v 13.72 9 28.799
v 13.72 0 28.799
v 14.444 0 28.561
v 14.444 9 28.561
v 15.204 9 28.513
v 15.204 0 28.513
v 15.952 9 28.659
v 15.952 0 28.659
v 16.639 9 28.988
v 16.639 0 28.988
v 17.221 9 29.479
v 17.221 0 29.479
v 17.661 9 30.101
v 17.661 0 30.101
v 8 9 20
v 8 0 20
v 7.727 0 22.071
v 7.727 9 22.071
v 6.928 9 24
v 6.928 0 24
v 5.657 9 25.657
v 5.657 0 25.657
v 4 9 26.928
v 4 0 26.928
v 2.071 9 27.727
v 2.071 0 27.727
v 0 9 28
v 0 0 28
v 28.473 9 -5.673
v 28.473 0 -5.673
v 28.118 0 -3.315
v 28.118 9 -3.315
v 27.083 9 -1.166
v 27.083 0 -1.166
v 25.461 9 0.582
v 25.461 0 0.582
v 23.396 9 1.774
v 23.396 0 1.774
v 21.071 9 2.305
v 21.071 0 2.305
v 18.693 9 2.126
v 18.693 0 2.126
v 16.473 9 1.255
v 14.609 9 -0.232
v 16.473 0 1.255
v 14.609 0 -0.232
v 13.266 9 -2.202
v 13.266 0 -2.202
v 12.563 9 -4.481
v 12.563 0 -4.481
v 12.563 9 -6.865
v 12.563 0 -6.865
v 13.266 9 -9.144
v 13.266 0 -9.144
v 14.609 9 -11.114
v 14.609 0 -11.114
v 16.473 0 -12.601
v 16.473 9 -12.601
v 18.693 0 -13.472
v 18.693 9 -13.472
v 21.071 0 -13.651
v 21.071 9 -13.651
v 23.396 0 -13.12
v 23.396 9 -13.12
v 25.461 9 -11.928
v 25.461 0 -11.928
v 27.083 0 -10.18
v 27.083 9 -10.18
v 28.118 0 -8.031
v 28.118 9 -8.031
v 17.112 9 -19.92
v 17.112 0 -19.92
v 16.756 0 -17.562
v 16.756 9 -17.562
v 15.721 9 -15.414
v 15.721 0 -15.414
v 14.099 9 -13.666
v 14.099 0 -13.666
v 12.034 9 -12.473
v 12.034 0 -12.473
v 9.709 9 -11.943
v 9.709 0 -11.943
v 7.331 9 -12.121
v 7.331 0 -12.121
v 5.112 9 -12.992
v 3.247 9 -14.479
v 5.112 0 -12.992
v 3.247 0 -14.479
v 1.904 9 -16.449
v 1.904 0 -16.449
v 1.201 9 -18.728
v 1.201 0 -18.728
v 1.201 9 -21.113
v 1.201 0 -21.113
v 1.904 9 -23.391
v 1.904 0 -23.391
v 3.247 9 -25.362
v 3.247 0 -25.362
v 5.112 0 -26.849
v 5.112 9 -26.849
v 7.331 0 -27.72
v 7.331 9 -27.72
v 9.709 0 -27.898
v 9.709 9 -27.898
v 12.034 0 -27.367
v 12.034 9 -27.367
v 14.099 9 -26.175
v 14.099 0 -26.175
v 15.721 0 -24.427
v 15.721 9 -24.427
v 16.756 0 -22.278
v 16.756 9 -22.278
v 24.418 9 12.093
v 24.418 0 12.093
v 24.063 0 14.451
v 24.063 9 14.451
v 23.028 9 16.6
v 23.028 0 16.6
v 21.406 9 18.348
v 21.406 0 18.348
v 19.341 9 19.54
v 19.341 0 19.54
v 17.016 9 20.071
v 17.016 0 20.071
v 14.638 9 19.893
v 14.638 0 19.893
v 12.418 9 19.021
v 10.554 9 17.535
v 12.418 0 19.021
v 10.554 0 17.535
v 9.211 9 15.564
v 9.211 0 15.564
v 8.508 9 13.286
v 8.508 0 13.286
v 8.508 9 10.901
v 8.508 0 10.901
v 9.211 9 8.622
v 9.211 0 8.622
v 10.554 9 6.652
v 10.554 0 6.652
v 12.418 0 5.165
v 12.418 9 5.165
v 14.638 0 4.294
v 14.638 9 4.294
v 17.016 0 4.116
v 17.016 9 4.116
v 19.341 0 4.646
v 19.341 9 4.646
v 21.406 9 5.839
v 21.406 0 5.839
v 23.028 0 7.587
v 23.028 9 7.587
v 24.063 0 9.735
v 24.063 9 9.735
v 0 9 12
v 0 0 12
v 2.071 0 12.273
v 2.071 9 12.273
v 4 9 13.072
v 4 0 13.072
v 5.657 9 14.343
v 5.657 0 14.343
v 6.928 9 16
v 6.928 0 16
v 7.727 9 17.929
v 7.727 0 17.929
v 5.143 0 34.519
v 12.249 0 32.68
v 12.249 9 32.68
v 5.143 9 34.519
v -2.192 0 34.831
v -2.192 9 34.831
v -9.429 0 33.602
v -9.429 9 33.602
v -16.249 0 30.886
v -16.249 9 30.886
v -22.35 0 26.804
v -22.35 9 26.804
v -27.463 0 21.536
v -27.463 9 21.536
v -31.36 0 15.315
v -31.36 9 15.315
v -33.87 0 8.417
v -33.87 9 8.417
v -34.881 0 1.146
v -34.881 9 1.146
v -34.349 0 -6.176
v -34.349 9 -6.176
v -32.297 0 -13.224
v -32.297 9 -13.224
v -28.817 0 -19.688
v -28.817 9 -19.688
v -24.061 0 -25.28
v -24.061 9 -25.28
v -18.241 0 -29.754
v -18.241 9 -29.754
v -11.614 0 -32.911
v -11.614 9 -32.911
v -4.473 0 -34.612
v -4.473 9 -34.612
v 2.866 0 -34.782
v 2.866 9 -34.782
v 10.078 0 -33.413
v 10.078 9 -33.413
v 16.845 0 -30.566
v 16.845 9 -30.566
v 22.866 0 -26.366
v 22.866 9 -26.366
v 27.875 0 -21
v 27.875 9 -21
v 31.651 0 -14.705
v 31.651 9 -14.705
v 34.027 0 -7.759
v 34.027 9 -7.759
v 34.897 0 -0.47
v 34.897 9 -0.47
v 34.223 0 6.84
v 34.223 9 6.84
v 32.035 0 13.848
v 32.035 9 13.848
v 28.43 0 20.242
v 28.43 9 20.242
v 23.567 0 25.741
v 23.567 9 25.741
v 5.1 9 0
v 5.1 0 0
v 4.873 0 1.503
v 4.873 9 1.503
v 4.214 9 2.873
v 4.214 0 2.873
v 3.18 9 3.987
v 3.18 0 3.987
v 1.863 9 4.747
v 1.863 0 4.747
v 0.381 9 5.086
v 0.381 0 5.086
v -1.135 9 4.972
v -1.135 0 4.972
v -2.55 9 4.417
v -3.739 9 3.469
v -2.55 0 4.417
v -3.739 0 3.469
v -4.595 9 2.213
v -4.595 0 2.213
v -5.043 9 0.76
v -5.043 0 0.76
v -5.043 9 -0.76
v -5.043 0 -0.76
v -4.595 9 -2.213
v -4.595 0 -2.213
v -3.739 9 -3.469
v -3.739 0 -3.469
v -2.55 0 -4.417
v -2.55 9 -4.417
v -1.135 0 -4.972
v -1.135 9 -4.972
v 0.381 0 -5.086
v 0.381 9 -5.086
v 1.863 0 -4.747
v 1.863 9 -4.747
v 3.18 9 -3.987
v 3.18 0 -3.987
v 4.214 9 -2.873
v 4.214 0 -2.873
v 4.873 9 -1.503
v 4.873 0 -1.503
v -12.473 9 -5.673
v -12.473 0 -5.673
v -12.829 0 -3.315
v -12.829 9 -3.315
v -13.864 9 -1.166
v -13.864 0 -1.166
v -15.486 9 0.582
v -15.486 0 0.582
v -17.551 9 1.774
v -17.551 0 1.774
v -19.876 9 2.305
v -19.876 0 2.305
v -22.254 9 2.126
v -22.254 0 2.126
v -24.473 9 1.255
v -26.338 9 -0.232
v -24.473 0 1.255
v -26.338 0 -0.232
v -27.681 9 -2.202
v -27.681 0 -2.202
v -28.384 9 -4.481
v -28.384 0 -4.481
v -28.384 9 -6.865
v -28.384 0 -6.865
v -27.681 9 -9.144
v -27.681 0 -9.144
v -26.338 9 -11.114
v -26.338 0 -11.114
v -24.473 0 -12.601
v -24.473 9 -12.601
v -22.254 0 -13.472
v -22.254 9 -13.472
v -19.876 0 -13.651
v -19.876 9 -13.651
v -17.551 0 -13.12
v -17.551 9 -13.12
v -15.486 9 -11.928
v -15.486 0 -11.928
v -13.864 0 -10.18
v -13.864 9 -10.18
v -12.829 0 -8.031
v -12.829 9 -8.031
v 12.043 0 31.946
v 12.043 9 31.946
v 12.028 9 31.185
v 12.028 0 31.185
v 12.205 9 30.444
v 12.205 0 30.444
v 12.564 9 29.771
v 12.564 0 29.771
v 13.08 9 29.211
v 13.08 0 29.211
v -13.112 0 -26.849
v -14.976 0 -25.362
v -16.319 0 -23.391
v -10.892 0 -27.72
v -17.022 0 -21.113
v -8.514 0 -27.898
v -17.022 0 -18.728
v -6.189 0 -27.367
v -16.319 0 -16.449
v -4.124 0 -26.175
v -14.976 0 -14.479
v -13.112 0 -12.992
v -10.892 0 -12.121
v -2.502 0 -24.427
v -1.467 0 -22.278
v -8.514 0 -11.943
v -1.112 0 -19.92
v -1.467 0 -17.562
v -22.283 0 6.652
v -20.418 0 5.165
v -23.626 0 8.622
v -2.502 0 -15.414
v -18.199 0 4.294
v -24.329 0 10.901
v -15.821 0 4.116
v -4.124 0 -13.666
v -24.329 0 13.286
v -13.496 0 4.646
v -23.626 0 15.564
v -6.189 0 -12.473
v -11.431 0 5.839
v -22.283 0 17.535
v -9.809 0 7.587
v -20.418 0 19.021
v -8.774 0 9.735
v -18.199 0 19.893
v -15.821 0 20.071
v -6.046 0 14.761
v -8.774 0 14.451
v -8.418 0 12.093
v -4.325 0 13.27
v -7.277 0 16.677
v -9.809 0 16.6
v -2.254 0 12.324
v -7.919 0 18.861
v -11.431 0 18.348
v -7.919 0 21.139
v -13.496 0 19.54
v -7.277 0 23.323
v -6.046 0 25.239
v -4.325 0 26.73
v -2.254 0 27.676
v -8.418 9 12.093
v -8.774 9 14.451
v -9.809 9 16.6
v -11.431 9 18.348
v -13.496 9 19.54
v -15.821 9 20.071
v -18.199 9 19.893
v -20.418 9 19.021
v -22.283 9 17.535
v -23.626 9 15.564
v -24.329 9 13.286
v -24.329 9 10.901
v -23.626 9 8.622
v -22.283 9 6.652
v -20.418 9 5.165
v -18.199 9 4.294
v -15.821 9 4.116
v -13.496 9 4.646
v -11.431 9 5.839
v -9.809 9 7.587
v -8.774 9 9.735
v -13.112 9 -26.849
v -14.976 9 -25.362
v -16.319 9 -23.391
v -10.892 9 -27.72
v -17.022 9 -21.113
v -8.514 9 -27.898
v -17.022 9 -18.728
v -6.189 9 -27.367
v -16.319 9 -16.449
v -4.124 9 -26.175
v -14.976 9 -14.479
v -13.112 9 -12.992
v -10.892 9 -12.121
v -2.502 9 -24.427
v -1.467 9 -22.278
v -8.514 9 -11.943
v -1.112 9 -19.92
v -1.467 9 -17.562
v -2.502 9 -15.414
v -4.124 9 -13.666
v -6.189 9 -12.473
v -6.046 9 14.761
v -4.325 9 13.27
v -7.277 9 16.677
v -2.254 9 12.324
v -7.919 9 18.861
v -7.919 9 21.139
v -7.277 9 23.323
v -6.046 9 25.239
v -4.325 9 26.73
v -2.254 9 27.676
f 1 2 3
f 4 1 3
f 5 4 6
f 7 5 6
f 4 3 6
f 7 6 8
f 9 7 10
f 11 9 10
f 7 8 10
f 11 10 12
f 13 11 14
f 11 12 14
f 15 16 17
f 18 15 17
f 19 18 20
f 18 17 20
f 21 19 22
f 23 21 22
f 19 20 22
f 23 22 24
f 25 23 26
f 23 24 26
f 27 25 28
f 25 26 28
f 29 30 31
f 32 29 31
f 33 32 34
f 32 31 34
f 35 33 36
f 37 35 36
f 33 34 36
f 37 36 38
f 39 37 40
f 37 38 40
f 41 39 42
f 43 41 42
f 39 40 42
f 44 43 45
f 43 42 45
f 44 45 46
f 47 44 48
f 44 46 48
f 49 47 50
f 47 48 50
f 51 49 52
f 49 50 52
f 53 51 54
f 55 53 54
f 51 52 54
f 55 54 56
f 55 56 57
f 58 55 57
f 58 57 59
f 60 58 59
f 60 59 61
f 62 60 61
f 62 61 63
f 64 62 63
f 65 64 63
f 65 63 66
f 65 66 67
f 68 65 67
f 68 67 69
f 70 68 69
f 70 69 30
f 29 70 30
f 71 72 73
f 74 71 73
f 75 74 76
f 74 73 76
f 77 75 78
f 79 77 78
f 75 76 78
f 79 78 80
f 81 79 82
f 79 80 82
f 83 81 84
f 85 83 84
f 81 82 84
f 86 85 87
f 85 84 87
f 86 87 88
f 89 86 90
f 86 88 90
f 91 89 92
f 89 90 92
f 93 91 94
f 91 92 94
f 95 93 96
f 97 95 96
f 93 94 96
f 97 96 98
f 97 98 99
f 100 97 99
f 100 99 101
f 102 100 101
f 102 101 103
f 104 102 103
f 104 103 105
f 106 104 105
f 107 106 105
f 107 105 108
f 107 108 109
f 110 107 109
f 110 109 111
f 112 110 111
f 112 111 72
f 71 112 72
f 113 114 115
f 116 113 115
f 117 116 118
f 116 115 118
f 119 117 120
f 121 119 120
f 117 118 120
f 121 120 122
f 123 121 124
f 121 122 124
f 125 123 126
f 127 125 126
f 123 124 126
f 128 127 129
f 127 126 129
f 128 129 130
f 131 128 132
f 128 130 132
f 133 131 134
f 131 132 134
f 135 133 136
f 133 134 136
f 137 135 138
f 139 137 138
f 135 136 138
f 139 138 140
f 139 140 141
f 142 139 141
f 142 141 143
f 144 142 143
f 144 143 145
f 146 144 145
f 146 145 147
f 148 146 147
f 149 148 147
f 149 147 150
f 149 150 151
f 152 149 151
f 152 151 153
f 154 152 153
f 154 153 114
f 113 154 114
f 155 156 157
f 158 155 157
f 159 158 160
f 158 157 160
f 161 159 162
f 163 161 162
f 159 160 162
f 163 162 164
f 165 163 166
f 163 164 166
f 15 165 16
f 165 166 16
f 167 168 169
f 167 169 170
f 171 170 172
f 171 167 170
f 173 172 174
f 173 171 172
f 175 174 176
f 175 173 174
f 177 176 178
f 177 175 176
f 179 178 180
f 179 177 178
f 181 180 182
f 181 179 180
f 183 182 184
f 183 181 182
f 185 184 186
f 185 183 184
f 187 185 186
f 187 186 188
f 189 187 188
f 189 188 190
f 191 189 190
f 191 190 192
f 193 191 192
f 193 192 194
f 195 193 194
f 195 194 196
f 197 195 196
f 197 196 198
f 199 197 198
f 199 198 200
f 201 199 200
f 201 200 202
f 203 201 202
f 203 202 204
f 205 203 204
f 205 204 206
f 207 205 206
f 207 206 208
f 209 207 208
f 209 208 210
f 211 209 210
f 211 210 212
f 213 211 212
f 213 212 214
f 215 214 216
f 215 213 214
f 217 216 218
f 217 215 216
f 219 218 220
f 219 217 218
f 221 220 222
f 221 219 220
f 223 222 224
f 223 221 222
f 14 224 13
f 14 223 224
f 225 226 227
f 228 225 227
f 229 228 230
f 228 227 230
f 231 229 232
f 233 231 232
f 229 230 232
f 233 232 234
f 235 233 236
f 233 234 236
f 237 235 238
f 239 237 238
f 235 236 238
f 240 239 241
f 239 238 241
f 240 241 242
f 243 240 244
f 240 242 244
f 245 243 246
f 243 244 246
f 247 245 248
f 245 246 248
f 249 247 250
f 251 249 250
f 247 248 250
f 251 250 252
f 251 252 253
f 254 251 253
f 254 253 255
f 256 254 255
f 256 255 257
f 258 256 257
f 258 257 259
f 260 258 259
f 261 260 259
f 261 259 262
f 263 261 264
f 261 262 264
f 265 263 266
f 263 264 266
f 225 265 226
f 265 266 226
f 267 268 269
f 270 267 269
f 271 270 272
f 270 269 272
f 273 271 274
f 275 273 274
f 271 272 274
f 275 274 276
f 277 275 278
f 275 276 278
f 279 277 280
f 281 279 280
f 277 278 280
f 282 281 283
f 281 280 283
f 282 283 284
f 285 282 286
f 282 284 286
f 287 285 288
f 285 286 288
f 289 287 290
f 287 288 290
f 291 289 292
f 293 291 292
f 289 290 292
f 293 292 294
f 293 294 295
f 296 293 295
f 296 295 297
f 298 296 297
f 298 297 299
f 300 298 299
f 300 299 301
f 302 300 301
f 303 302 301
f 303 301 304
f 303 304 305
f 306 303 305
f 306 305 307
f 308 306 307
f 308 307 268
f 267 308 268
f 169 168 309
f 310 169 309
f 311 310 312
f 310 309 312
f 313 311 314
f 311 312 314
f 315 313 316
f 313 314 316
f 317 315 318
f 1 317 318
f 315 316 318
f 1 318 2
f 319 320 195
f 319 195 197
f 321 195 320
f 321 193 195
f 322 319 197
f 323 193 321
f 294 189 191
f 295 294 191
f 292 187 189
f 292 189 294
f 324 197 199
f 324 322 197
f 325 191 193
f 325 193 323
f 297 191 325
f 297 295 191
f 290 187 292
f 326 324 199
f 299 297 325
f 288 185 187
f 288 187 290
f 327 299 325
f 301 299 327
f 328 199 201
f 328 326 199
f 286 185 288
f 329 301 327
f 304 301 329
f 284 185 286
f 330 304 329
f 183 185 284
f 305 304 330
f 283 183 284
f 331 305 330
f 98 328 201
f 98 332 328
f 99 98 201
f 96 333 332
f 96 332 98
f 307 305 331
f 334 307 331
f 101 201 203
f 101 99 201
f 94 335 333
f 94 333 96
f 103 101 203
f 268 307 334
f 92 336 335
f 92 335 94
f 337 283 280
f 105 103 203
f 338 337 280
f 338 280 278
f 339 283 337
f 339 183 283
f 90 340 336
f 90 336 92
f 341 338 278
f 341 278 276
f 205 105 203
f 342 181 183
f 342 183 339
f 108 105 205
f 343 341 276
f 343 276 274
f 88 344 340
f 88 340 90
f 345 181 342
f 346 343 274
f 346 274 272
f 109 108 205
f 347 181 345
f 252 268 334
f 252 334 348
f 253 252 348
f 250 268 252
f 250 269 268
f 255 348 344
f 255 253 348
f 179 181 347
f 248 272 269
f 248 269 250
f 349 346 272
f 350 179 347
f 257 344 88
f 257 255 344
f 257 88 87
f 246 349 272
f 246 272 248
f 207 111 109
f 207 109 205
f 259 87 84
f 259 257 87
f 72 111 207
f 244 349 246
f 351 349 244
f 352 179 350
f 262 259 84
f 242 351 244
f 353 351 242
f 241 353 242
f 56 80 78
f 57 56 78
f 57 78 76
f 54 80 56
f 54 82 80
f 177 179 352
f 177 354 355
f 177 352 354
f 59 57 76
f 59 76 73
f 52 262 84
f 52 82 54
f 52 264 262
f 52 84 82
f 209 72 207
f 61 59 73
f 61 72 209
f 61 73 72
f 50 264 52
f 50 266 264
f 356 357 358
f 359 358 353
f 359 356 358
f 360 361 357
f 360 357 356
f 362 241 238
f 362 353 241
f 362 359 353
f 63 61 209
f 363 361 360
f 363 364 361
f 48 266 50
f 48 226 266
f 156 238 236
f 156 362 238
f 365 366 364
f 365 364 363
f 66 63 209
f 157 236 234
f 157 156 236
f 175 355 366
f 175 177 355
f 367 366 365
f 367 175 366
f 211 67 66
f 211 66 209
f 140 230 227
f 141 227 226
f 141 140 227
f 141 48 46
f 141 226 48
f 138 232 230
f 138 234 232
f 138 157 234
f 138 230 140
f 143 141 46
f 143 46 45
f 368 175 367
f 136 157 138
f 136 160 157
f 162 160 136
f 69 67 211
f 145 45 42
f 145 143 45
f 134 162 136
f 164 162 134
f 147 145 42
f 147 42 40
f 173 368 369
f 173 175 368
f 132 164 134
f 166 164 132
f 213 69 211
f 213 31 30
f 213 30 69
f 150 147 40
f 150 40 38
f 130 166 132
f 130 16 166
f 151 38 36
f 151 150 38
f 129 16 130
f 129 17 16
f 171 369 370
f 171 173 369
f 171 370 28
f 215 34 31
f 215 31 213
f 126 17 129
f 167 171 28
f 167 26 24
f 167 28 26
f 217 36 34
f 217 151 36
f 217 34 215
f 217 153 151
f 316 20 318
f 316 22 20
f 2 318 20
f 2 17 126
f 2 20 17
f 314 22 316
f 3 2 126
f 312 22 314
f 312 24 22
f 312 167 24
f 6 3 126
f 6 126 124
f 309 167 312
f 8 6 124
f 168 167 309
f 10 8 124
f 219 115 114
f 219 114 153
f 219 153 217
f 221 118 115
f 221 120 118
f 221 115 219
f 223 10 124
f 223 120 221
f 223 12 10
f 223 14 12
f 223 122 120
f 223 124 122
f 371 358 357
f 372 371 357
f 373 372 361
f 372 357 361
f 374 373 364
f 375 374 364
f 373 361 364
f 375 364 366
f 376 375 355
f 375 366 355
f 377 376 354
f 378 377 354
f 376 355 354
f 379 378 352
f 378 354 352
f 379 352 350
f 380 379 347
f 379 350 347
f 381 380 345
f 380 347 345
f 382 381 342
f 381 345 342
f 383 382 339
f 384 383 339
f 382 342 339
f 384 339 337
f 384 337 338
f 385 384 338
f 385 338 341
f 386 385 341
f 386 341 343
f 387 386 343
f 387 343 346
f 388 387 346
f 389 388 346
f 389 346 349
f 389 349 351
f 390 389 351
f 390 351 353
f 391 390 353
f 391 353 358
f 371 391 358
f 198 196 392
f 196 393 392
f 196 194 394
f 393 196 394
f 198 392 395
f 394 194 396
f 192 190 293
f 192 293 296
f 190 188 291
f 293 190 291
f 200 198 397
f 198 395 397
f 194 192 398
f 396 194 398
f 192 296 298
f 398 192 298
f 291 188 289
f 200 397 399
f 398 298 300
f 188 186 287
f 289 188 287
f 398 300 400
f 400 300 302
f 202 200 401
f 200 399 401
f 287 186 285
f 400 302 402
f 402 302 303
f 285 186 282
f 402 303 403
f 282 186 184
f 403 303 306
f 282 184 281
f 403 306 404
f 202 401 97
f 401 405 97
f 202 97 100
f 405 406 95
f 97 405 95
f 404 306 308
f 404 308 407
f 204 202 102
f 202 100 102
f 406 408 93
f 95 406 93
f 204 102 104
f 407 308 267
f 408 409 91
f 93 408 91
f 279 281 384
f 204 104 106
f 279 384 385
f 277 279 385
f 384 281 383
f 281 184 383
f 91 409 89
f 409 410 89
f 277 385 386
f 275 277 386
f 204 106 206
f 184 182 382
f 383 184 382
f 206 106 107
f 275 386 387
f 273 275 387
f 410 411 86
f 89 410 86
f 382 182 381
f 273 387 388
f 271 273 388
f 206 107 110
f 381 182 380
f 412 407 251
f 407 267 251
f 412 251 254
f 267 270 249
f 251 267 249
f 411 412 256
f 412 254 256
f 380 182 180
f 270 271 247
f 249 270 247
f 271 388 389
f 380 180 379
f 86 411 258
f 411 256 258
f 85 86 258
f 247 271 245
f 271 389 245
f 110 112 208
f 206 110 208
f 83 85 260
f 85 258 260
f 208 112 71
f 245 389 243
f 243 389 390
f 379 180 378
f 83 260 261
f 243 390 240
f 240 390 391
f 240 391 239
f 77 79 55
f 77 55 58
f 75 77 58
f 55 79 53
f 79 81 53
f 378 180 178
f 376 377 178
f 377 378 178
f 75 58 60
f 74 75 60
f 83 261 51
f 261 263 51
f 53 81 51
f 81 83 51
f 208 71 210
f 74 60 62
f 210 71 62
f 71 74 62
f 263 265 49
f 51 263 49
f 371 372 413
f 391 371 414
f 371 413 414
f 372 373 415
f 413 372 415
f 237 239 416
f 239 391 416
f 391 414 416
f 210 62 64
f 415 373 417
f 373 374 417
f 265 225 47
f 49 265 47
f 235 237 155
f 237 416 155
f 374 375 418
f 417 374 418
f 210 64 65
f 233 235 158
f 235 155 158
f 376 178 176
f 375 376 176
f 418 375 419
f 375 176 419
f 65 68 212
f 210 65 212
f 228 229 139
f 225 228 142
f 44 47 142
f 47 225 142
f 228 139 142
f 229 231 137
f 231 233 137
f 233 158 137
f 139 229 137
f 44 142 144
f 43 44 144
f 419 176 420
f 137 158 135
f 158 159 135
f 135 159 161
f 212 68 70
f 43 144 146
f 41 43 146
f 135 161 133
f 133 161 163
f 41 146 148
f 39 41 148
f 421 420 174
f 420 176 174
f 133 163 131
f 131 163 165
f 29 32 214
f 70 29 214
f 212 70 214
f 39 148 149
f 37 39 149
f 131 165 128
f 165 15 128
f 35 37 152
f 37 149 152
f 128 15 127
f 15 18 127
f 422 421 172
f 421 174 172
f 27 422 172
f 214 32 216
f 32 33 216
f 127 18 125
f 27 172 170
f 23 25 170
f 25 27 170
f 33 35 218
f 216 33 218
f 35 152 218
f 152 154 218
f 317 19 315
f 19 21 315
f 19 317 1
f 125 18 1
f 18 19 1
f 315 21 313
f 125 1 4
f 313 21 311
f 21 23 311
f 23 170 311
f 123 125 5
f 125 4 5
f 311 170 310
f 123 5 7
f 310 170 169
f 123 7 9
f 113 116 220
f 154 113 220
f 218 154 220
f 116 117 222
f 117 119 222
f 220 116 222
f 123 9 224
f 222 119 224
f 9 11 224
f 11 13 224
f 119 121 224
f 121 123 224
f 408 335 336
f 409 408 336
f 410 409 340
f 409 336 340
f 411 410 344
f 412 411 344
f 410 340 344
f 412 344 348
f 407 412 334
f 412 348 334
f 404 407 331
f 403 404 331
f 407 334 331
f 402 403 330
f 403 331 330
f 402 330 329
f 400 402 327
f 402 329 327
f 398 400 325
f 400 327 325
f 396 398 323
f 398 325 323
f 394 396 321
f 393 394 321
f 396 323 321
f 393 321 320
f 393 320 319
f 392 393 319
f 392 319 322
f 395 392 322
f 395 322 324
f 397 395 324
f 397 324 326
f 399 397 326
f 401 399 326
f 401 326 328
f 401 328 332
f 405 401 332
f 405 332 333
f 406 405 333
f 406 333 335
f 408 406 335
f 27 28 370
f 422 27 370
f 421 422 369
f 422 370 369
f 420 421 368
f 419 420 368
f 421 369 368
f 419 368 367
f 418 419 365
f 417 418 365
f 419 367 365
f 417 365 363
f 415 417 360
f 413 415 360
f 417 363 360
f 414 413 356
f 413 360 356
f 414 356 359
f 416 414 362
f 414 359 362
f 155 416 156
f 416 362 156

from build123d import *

# Parameters (mm, degrees)
F0_R     = 34.9
F0_R_2   = 5.1
F1_DEPTH = 9
F2_R     = 8
F3_DEPTH = 10
F5_DEPTH = 10


# Not quite as in the source:
# - a feature names something its author has since deleted; it is built from what else it names


with BuildPart() as f1:
    # F0 (on Front) → F1 (new body)
    with BuildSketch(Plane.XZ):
        Circle(F0_R)
        Circle(F0_R_2, mode=Mode.SUBTRACT)
    extrude(amount=-F1_DEPTH)

    # F2 (on Front) → F3 (cut)
    with BuildSketch(Plane.XZ):
        with Locations((-16.4184611318, 12.093285839)):
            Circle(F2_R)
        with Locations((-20.4734861558, -5.6729396131)):
            Circle(F2_R)
        with Locations((-9.1115585215, -19.920346226)):
            Circle(F2_R)
        with Locations((9.1115585215, -19.920346226)):
            Circle(F2_R)
        with Locations((20.4734861558, -5.6729396131)):
            Circle(F2_R)
        with BuildLine():
            ThreePointArc((8, 20), (5.6568542495, 25.6568542495), (0, 28))
            Line((0, 28), (0, 12))
            ThreePointArc((0, 12), (5.6568542495, 14.3431457505), (8, 20))
        make_face()
        with BuildLine():
            Line((0, 12), (0, 28))
            ThreePointArc((0, 28), (-8, 20), (0, 12))
        make_face()
        with Locations((16.4184611318, 12.093285839)):
            Circle(F2_R)
    extrude(amount=-F3_DEPTH, mode=Mode.SUBTRACT)

    # F4 (on face) → F5 (cut)
    with BuildSketch(Plane.XZ):
        with BuildLine():
            ThreePointArc((12.2493254993, 32.6797188607), (12.2053527551, 30.4437628813), (13.7203077268, 28.7986658698))
            Line((13.7203077268, 28.7986658698), (15.0106187983, 31.5070043529))
            ThreePointArc((15.0106187983, 31.5070043529), (13.6425787741, 32.1230453786), (12.2493254993, 32.6797188607))
        make_face()
        with BuildLine():
            Line((15.0106187983, 31.5070043529), (13.7203077268, 28.7986658698))
            ThreePointArc((13.7203077268, 28.7986658698), (15.9523075922, 28.6586324994), (17.6609971055, 30.1014813795))
            ThreePointArc((17.6609971055, 30.1014813795), (16.3509172571, 30.8327343071), (15.0106187983, 31.5070043529))
        make_face()
    extrude(amount=-F5_DEPTH, mode=Mode.SUBTRACT)


solid = f1.part
